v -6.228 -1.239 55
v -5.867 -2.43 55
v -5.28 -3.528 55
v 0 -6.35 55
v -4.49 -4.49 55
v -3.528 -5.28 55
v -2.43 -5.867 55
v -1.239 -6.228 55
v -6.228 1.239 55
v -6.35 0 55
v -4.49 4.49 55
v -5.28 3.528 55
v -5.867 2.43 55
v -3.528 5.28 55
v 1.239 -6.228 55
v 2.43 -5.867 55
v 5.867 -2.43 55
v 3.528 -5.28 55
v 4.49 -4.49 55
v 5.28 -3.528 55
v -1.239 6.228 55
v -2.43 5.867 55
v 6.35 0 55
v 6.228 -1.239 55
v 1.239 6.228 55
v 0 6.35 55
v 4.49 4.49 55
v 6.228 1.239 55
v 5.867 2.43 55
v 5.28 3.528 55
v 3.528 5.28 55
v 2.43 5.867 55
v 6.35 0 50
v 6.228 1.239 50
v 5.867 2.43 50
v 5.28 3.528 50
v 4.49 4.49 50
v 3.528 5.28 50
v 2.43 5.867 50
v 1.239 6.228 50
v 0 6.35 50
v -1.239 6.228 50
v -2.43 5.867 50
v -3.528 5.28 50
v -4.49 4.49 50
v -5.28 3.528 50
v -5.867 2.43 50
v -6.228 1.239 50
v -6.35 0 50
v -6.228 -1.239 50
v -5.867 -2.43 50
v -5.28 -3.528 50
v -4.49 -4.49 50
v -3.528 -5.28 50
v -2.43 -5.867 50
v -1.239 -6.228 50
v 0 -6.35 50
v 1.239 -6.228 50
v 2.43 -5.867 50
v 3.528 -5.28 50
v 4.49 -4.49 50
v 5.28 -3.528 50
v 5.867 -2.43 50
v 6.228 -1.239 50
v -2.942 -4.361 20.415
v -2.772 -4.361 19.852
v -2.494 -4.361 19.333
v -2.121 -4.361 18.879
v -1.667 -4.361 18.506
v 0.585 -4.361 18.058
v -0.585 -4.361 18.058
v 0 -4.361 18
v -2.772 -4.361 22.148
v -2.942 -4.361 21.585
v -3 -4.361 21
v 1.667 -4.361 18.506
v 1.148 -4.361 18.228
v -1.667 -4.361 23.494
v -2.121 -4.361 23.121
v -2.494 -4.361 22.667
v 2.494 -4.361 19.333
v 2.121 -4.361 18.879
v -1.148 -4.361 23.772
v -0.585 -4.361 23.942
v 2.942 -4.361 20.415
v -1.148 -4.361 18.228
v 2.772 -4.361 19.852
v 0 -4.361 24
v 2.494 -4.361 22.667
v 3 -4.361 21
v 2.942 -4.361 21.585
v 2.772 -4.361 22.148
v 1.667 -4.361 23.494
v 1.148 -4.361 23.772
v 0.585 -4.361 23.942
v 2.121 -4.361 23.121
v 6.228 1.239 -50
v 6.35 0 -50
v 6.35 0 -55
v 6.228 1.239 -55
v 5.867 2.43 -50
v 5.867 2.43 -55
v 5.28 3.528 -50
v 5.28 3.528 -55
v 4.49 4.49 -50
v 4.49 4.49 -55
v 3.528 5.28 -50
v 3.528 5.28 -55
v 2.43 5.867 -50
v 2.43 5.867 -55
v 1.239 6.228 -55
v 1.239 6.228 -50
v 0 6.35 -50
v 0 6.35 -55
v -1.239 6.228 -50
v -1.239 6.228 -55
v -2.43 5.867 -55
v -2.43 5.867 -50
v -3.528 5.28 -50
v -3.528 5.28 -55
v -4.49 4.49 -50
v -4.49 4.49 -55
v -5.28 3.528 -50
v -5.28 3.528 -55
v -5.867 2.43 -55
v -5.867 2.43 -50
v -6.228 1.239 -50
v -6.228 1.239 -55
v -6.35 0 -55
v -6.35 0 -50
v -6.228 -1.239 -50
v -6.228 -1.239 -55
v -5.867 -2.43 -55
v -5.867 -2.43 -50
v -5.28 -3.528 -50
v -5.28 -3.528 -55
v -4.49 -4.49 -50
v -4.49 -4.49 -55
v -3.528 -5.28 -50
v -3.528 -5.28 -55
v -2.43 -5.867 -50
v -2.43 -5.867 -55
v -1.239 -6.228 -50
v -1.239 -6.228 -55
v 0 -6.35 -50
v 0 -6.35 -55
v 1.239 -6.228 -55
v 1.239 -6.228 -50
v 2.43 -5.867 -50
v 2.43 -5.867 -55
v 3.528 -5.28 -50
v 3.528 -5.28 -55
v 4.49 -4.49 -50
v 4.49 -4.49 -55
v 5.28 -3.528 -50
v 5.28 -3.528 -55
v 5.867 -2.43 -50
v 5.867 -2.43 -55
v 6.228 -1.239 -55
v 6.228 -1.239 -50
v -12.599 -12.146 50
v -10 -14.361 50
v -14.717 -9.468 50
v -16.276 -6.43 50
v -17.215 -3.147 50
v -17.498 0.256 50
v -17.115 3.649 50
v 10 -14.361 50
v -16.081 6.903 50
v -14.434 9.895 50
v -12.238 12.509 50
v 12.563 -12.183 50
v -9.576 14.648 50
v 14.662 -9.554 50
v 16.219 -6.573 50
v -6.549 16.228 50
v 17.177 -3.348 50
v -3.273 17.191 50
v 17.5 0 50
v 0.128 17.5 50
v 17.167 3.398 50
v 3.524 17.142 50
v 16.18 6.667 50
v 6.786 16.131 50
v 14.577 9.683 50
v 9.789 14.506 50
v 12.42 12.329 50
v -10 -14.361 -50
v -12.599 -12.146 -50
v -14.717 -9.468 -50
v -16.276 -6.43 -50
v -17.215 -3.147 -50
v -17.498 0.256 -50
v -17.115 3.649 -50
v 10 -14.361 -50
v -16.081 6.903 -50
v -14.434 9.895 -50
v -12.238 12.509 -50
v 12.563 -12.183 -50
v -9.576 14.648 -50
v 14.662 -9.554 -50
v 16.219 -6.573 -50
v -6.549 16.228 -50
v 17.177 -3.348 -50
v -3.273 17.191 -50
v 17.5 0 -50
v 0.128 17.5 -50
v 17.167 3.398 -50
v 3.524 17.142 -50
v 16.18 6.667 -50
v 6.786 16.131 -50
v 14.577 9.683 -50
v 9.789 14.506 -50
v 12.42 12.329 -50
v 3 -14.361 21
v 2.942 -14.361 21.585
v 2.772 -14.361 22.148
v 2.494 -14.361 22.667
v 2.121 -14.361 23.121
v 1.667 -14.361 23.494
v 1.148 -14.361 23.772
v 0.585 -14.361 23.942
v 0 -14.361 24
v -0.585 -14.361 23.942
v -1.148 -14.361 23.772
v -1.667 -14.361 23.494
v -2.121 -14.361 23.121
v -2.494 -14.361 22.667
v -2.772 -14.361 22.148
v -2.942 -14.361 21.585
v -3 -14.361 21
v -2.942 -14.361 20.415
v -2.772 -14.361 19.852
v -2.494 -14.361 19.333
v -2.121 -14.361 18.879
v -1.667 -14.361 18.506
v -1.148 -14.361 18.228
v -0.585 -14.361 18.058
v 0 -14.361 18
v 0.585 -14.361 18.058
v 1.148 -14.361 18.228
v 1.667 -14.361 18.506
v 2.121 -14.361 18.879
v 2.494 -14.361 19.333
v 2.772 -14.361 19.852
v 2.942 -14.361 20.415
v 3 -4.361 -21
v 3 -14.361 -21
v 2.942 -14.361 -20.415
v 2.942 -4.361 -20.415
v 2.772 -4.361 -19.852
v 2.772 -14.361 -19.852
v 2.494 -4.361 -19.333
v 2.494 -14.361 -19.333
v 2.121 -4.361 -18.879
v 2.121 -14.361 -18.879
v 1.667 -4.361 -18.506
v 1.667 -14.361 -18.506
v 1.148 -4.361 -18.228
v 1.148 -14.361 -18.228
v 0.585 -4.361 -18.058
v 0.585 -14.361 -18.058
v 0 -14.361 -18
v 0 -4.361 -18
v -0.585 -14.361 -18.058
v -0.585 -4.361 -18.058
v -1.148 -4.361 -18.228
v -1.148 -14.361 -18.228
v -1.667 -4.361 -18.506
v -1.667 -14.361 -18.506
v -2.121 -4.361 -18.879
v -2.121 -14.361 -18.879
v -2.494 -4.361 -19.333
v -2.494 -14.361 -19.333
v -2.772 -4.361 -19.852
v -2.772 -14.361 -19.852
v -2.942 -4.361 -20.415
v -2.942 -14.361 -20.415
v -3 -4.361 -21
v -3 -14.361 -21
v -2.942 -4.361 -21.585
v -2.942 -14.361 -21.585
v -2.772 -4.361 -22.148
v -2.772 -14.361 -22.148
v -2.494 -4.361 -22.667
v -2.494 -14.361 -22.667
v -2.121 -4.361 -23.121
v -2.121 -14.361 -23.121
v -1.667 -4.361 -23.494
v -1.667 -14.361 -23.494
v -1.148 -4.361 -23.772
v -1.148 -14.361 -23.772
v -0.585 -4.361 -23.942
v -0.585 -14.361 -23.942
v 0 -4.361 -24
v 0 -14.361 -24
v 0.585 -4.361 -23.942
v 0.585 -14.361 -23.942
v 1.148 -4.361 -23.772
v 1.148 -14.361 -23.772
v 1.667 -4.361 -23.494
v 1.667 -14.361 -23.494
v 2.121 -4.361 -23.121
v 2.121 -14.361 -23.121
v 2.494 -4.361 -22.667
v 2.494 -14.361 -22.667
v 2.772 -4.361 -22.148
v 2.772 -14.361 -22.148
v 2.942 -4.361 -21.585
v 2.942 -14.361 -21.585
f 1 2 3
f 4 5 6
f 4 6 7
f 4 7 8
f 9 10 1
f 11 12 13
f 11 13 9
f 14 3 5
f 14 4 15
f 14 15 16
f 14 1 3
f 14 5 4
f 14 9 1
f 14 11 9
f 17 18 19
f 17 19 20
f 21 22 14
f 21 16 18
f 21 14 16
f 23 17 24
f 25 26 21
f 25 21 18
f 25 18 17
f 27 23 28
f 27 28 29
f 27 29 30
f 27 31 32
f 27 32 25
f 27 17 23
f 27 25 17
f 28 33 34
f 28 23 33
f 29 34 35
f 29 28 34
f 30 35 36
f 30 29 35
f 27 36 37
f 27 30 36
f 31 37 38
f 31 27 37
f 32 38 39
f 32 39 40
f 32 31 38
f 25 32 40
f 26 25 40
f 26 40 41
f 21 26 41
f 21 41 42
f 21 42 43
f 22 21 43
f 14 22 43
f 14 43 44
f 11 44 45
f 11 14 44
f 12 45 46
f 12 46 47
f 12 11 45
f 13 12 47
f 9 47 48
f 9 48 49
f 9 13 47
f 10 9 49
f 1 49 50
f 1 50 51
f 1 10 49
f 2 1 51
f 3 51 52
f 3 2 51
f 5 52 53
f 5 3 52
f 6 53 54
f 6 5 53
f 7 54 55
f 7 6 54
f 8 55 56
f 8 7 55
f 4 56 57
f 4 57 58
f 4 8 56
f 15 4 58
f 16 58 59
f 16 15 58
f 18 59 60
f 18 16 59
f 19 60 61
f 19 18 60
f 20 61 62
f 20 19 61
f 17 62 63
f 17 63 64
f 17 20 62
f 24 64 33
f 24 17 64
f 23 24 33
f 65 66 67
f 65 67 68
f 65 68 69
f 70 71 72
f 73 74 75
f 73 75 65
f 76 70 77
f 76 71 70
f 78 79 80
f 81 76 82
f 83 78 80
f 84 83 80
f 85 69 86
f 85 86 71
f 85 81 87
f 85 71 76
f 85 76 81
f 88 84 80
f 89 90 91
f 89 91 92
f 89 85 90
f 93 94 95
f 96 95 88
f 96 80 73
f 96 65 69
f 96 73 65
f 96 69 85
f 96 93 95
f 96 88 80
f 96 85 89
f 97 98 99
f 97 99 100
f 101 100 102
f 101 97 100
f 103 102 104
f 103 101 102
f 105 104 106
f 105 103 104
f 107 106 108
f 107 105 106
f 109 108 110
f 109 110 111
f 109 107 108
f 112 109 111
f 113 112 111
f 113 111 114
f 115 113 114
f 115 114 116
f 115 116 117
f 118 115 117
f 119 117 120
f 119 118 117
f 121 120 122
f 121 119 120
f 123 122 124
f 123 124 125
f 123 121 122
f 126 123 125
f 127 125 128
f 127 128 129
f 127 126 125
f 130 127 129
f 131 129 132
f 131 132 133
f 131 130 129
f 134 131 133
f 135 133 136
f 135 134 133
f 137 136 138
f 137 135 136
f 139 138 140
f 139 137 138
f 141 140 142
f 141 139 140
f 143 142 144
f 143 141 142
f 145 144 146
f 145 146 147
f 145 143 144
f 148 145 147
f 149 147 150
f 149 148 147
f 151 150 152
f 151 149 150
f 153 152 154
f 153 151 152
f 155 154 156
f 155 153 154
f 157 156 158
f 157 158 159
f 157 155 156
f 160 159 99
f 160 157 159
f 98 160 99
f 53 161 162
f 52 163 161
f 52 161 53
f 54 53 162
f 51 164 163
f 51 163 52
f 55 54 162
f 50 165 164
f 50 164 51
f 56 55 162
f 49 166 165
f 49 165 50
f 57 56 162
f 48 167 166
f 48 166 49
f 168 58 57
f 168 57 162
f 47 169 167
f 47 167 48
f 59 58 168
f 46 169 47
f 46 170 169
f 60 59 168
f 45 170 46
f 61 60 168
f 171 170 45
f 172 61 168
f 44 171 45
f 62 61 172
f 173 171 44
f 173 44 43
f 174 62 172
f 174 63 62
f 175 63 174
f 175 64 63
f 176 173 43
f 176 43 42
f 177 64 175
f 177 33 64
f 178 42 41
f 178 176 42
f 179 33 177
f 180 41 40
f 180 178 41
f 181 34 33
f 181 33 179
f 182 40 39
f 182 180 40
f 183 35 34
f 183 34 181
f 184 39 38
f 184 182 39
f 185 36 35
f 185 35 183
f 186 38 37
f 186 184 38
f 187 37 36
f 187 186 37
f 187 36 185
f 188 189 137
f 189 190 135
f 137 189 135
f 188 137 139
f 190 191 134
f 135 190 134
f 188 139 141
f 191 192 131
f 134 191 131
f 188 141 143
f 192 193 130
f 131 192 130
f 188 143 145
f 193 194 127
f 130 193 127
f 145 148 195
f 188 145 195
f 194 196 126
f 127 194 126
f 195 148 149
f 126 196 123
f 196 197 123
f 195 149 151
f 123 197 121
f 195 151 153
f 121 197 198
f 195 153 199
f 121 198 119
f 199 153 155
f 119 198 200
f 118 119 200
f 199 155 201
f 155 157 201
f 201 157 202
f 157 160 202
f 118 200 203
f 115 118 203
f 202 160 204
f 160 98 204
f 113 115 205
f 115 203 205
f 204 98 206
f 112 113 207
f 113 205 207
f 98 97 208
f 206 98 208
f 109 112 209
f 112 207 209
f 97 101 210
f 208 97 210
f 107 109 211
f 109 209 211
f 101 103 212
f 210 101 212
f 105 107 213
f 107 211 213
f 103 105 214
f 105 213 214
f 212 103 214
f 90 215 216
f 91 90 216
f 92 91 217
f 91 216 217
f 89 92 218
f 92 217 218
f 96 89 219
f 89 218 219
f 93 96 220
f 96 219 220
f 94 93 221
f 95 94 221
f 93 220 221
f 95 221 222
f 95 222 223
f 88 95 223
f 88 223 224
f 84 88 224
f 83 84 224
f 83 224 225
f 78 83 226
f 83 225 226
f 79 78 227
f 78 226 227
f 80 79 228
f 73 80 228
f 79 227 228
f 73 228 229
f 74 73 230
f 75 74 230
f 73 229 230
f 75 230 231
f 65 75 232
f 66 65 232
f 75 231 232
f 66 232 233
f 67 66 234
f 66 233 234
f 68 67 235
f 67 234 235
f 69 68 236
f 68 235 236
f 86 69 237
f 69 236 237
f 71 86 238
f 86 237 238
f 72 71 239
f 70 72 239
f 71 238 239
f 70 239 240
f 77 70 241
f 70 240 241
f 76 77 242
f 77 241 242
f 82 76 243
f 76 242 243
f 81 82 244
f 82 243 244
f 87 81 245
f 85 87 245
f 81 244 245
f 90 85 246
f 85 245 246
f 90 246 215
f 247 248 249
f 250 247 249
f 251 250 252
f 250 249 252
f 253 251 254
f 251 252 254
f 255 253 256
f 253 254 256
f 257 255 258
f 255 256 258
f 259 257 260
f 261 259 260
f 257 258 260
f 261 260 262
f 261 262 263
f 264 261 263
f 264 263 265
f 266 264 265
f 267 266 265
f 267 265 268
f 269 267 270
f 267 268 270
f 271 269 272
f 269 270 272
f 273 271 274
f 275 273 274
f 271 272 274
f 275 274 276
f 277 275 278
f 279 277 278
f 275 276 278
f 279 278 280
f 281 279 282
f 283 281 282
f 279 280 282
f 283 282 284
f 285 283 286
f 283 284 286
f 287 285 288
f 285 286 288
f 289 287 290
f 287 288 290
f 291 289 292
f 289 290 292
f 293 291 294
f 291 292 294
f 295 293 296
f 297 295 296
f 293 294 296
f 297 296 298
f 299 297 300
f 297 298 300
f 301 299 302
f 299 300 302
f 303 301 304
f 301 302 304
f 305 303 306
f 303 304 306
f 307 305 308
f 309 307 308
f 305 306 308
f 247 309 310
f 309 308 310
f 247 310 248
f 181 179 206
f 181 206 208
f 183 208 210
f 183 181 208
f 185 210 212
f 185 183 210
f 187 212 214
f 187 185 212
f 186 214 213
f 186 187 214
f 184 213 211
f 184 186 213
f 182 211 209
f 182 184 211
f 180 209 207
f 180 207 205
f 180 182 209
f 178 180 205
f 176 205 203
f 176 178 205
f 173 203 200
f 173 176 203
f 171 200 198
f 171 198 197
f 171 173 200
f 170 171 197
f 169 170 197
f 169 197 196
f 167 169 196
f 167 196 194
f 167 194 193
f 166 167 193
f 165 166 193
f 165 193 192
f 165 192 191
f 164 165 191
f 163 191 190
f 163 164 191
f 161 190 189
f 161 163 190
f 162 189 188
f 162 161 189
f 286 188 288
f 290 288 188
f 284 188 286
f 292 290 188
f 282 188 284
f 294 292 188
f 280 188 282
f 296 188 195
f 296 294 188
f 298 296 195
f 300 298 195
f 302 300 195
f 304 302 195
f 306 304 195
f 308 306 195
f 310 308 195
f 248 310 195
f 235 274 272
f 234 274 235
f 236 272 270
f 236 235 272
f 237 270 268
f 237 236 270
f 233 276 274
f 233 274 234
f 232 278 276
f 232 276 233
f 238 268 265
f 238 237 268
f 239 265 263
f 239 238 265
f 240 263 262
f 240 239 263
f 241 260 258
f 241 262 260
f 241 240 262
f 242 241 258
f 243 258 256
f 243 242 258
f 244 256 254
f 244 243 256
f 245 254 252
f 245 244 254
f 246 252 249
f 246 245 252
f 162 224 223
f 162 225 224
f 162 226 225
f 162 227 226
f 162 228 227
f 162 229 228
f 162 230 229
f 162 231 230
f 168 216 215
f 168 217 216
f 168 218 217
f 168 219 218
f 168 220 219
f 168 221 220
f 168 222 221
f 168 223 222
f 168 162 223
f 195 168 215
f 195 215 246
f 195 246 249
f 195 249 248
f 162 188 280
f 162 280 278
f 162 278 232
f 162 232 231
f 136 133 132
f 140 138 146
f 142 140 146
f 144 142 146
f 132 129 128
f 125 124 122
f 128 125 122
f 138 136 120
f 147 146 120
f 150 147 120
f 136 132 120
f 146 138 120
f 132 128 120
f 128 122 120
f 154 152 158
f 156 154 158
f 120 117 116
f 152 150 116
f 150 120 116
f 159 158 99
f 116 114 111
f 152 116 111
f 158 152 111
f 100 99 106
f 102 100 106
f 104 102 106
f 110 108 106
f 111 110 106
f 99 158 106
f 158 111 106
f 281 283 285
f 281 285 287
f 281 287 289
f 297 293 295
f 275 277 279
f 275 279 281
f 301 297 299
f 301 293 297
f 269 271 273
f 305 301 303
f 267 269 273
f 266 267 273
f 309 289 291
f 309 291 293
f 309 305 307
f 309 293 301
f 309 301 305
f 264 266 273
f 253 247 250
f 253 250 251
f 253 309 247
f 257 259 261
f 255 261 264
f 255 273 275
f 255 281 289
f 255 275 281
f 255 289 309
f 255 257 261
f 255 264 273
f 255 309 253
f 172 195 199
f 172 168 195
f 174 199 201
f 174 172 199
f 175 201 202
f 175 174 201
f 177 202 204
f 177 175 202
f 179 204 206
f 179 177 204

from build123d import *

# Parameters (mm, degrees)
F0_R     = 6.35
F1_DEPTH = 50
F2_DEPTH = 55
F3_R     = 3
F4_DEPTH = 10


with BuildPart() as f1:
    # F0 (on Top) → F1 (new body, symmetric)
    with BuildSketch(Plane.XY):
        with BuildLine():
            ThreePointArc((10, -14.361407), (15.512092, -8.100926), (17.5, 0))
            ThreePointArc((17.5, 0), (-8.100926, 15.512092), (-10, -14.361407))
            Line((-10, -14.361407), (10, -14.361407))
        make_face()
        Circle(F0_R, mode=Mode.SUBTRACT)
        Circle(F0_R)
    extrude(amount=F1_DEPTH, both=True)

    # F0 (on Top) → F2 (join, symmetric)
    with BuildSketch(Plane.XY):
        Circle(F0_R)
    extrude(amount=F2_DEPTH, both=True)

    # F3 (on face) → F4 (cut)
    with BuildSketch(Plane.XZ.offset(14.361407)):
        with Locations((0, 21)):
            Circle(F3_R)
        with Locations((0, -21)):
            Circle(F3_R)
    extrude(amount=-F4_DEPTH, mode=Mode.SUBTRACT)


solid = f1.part
